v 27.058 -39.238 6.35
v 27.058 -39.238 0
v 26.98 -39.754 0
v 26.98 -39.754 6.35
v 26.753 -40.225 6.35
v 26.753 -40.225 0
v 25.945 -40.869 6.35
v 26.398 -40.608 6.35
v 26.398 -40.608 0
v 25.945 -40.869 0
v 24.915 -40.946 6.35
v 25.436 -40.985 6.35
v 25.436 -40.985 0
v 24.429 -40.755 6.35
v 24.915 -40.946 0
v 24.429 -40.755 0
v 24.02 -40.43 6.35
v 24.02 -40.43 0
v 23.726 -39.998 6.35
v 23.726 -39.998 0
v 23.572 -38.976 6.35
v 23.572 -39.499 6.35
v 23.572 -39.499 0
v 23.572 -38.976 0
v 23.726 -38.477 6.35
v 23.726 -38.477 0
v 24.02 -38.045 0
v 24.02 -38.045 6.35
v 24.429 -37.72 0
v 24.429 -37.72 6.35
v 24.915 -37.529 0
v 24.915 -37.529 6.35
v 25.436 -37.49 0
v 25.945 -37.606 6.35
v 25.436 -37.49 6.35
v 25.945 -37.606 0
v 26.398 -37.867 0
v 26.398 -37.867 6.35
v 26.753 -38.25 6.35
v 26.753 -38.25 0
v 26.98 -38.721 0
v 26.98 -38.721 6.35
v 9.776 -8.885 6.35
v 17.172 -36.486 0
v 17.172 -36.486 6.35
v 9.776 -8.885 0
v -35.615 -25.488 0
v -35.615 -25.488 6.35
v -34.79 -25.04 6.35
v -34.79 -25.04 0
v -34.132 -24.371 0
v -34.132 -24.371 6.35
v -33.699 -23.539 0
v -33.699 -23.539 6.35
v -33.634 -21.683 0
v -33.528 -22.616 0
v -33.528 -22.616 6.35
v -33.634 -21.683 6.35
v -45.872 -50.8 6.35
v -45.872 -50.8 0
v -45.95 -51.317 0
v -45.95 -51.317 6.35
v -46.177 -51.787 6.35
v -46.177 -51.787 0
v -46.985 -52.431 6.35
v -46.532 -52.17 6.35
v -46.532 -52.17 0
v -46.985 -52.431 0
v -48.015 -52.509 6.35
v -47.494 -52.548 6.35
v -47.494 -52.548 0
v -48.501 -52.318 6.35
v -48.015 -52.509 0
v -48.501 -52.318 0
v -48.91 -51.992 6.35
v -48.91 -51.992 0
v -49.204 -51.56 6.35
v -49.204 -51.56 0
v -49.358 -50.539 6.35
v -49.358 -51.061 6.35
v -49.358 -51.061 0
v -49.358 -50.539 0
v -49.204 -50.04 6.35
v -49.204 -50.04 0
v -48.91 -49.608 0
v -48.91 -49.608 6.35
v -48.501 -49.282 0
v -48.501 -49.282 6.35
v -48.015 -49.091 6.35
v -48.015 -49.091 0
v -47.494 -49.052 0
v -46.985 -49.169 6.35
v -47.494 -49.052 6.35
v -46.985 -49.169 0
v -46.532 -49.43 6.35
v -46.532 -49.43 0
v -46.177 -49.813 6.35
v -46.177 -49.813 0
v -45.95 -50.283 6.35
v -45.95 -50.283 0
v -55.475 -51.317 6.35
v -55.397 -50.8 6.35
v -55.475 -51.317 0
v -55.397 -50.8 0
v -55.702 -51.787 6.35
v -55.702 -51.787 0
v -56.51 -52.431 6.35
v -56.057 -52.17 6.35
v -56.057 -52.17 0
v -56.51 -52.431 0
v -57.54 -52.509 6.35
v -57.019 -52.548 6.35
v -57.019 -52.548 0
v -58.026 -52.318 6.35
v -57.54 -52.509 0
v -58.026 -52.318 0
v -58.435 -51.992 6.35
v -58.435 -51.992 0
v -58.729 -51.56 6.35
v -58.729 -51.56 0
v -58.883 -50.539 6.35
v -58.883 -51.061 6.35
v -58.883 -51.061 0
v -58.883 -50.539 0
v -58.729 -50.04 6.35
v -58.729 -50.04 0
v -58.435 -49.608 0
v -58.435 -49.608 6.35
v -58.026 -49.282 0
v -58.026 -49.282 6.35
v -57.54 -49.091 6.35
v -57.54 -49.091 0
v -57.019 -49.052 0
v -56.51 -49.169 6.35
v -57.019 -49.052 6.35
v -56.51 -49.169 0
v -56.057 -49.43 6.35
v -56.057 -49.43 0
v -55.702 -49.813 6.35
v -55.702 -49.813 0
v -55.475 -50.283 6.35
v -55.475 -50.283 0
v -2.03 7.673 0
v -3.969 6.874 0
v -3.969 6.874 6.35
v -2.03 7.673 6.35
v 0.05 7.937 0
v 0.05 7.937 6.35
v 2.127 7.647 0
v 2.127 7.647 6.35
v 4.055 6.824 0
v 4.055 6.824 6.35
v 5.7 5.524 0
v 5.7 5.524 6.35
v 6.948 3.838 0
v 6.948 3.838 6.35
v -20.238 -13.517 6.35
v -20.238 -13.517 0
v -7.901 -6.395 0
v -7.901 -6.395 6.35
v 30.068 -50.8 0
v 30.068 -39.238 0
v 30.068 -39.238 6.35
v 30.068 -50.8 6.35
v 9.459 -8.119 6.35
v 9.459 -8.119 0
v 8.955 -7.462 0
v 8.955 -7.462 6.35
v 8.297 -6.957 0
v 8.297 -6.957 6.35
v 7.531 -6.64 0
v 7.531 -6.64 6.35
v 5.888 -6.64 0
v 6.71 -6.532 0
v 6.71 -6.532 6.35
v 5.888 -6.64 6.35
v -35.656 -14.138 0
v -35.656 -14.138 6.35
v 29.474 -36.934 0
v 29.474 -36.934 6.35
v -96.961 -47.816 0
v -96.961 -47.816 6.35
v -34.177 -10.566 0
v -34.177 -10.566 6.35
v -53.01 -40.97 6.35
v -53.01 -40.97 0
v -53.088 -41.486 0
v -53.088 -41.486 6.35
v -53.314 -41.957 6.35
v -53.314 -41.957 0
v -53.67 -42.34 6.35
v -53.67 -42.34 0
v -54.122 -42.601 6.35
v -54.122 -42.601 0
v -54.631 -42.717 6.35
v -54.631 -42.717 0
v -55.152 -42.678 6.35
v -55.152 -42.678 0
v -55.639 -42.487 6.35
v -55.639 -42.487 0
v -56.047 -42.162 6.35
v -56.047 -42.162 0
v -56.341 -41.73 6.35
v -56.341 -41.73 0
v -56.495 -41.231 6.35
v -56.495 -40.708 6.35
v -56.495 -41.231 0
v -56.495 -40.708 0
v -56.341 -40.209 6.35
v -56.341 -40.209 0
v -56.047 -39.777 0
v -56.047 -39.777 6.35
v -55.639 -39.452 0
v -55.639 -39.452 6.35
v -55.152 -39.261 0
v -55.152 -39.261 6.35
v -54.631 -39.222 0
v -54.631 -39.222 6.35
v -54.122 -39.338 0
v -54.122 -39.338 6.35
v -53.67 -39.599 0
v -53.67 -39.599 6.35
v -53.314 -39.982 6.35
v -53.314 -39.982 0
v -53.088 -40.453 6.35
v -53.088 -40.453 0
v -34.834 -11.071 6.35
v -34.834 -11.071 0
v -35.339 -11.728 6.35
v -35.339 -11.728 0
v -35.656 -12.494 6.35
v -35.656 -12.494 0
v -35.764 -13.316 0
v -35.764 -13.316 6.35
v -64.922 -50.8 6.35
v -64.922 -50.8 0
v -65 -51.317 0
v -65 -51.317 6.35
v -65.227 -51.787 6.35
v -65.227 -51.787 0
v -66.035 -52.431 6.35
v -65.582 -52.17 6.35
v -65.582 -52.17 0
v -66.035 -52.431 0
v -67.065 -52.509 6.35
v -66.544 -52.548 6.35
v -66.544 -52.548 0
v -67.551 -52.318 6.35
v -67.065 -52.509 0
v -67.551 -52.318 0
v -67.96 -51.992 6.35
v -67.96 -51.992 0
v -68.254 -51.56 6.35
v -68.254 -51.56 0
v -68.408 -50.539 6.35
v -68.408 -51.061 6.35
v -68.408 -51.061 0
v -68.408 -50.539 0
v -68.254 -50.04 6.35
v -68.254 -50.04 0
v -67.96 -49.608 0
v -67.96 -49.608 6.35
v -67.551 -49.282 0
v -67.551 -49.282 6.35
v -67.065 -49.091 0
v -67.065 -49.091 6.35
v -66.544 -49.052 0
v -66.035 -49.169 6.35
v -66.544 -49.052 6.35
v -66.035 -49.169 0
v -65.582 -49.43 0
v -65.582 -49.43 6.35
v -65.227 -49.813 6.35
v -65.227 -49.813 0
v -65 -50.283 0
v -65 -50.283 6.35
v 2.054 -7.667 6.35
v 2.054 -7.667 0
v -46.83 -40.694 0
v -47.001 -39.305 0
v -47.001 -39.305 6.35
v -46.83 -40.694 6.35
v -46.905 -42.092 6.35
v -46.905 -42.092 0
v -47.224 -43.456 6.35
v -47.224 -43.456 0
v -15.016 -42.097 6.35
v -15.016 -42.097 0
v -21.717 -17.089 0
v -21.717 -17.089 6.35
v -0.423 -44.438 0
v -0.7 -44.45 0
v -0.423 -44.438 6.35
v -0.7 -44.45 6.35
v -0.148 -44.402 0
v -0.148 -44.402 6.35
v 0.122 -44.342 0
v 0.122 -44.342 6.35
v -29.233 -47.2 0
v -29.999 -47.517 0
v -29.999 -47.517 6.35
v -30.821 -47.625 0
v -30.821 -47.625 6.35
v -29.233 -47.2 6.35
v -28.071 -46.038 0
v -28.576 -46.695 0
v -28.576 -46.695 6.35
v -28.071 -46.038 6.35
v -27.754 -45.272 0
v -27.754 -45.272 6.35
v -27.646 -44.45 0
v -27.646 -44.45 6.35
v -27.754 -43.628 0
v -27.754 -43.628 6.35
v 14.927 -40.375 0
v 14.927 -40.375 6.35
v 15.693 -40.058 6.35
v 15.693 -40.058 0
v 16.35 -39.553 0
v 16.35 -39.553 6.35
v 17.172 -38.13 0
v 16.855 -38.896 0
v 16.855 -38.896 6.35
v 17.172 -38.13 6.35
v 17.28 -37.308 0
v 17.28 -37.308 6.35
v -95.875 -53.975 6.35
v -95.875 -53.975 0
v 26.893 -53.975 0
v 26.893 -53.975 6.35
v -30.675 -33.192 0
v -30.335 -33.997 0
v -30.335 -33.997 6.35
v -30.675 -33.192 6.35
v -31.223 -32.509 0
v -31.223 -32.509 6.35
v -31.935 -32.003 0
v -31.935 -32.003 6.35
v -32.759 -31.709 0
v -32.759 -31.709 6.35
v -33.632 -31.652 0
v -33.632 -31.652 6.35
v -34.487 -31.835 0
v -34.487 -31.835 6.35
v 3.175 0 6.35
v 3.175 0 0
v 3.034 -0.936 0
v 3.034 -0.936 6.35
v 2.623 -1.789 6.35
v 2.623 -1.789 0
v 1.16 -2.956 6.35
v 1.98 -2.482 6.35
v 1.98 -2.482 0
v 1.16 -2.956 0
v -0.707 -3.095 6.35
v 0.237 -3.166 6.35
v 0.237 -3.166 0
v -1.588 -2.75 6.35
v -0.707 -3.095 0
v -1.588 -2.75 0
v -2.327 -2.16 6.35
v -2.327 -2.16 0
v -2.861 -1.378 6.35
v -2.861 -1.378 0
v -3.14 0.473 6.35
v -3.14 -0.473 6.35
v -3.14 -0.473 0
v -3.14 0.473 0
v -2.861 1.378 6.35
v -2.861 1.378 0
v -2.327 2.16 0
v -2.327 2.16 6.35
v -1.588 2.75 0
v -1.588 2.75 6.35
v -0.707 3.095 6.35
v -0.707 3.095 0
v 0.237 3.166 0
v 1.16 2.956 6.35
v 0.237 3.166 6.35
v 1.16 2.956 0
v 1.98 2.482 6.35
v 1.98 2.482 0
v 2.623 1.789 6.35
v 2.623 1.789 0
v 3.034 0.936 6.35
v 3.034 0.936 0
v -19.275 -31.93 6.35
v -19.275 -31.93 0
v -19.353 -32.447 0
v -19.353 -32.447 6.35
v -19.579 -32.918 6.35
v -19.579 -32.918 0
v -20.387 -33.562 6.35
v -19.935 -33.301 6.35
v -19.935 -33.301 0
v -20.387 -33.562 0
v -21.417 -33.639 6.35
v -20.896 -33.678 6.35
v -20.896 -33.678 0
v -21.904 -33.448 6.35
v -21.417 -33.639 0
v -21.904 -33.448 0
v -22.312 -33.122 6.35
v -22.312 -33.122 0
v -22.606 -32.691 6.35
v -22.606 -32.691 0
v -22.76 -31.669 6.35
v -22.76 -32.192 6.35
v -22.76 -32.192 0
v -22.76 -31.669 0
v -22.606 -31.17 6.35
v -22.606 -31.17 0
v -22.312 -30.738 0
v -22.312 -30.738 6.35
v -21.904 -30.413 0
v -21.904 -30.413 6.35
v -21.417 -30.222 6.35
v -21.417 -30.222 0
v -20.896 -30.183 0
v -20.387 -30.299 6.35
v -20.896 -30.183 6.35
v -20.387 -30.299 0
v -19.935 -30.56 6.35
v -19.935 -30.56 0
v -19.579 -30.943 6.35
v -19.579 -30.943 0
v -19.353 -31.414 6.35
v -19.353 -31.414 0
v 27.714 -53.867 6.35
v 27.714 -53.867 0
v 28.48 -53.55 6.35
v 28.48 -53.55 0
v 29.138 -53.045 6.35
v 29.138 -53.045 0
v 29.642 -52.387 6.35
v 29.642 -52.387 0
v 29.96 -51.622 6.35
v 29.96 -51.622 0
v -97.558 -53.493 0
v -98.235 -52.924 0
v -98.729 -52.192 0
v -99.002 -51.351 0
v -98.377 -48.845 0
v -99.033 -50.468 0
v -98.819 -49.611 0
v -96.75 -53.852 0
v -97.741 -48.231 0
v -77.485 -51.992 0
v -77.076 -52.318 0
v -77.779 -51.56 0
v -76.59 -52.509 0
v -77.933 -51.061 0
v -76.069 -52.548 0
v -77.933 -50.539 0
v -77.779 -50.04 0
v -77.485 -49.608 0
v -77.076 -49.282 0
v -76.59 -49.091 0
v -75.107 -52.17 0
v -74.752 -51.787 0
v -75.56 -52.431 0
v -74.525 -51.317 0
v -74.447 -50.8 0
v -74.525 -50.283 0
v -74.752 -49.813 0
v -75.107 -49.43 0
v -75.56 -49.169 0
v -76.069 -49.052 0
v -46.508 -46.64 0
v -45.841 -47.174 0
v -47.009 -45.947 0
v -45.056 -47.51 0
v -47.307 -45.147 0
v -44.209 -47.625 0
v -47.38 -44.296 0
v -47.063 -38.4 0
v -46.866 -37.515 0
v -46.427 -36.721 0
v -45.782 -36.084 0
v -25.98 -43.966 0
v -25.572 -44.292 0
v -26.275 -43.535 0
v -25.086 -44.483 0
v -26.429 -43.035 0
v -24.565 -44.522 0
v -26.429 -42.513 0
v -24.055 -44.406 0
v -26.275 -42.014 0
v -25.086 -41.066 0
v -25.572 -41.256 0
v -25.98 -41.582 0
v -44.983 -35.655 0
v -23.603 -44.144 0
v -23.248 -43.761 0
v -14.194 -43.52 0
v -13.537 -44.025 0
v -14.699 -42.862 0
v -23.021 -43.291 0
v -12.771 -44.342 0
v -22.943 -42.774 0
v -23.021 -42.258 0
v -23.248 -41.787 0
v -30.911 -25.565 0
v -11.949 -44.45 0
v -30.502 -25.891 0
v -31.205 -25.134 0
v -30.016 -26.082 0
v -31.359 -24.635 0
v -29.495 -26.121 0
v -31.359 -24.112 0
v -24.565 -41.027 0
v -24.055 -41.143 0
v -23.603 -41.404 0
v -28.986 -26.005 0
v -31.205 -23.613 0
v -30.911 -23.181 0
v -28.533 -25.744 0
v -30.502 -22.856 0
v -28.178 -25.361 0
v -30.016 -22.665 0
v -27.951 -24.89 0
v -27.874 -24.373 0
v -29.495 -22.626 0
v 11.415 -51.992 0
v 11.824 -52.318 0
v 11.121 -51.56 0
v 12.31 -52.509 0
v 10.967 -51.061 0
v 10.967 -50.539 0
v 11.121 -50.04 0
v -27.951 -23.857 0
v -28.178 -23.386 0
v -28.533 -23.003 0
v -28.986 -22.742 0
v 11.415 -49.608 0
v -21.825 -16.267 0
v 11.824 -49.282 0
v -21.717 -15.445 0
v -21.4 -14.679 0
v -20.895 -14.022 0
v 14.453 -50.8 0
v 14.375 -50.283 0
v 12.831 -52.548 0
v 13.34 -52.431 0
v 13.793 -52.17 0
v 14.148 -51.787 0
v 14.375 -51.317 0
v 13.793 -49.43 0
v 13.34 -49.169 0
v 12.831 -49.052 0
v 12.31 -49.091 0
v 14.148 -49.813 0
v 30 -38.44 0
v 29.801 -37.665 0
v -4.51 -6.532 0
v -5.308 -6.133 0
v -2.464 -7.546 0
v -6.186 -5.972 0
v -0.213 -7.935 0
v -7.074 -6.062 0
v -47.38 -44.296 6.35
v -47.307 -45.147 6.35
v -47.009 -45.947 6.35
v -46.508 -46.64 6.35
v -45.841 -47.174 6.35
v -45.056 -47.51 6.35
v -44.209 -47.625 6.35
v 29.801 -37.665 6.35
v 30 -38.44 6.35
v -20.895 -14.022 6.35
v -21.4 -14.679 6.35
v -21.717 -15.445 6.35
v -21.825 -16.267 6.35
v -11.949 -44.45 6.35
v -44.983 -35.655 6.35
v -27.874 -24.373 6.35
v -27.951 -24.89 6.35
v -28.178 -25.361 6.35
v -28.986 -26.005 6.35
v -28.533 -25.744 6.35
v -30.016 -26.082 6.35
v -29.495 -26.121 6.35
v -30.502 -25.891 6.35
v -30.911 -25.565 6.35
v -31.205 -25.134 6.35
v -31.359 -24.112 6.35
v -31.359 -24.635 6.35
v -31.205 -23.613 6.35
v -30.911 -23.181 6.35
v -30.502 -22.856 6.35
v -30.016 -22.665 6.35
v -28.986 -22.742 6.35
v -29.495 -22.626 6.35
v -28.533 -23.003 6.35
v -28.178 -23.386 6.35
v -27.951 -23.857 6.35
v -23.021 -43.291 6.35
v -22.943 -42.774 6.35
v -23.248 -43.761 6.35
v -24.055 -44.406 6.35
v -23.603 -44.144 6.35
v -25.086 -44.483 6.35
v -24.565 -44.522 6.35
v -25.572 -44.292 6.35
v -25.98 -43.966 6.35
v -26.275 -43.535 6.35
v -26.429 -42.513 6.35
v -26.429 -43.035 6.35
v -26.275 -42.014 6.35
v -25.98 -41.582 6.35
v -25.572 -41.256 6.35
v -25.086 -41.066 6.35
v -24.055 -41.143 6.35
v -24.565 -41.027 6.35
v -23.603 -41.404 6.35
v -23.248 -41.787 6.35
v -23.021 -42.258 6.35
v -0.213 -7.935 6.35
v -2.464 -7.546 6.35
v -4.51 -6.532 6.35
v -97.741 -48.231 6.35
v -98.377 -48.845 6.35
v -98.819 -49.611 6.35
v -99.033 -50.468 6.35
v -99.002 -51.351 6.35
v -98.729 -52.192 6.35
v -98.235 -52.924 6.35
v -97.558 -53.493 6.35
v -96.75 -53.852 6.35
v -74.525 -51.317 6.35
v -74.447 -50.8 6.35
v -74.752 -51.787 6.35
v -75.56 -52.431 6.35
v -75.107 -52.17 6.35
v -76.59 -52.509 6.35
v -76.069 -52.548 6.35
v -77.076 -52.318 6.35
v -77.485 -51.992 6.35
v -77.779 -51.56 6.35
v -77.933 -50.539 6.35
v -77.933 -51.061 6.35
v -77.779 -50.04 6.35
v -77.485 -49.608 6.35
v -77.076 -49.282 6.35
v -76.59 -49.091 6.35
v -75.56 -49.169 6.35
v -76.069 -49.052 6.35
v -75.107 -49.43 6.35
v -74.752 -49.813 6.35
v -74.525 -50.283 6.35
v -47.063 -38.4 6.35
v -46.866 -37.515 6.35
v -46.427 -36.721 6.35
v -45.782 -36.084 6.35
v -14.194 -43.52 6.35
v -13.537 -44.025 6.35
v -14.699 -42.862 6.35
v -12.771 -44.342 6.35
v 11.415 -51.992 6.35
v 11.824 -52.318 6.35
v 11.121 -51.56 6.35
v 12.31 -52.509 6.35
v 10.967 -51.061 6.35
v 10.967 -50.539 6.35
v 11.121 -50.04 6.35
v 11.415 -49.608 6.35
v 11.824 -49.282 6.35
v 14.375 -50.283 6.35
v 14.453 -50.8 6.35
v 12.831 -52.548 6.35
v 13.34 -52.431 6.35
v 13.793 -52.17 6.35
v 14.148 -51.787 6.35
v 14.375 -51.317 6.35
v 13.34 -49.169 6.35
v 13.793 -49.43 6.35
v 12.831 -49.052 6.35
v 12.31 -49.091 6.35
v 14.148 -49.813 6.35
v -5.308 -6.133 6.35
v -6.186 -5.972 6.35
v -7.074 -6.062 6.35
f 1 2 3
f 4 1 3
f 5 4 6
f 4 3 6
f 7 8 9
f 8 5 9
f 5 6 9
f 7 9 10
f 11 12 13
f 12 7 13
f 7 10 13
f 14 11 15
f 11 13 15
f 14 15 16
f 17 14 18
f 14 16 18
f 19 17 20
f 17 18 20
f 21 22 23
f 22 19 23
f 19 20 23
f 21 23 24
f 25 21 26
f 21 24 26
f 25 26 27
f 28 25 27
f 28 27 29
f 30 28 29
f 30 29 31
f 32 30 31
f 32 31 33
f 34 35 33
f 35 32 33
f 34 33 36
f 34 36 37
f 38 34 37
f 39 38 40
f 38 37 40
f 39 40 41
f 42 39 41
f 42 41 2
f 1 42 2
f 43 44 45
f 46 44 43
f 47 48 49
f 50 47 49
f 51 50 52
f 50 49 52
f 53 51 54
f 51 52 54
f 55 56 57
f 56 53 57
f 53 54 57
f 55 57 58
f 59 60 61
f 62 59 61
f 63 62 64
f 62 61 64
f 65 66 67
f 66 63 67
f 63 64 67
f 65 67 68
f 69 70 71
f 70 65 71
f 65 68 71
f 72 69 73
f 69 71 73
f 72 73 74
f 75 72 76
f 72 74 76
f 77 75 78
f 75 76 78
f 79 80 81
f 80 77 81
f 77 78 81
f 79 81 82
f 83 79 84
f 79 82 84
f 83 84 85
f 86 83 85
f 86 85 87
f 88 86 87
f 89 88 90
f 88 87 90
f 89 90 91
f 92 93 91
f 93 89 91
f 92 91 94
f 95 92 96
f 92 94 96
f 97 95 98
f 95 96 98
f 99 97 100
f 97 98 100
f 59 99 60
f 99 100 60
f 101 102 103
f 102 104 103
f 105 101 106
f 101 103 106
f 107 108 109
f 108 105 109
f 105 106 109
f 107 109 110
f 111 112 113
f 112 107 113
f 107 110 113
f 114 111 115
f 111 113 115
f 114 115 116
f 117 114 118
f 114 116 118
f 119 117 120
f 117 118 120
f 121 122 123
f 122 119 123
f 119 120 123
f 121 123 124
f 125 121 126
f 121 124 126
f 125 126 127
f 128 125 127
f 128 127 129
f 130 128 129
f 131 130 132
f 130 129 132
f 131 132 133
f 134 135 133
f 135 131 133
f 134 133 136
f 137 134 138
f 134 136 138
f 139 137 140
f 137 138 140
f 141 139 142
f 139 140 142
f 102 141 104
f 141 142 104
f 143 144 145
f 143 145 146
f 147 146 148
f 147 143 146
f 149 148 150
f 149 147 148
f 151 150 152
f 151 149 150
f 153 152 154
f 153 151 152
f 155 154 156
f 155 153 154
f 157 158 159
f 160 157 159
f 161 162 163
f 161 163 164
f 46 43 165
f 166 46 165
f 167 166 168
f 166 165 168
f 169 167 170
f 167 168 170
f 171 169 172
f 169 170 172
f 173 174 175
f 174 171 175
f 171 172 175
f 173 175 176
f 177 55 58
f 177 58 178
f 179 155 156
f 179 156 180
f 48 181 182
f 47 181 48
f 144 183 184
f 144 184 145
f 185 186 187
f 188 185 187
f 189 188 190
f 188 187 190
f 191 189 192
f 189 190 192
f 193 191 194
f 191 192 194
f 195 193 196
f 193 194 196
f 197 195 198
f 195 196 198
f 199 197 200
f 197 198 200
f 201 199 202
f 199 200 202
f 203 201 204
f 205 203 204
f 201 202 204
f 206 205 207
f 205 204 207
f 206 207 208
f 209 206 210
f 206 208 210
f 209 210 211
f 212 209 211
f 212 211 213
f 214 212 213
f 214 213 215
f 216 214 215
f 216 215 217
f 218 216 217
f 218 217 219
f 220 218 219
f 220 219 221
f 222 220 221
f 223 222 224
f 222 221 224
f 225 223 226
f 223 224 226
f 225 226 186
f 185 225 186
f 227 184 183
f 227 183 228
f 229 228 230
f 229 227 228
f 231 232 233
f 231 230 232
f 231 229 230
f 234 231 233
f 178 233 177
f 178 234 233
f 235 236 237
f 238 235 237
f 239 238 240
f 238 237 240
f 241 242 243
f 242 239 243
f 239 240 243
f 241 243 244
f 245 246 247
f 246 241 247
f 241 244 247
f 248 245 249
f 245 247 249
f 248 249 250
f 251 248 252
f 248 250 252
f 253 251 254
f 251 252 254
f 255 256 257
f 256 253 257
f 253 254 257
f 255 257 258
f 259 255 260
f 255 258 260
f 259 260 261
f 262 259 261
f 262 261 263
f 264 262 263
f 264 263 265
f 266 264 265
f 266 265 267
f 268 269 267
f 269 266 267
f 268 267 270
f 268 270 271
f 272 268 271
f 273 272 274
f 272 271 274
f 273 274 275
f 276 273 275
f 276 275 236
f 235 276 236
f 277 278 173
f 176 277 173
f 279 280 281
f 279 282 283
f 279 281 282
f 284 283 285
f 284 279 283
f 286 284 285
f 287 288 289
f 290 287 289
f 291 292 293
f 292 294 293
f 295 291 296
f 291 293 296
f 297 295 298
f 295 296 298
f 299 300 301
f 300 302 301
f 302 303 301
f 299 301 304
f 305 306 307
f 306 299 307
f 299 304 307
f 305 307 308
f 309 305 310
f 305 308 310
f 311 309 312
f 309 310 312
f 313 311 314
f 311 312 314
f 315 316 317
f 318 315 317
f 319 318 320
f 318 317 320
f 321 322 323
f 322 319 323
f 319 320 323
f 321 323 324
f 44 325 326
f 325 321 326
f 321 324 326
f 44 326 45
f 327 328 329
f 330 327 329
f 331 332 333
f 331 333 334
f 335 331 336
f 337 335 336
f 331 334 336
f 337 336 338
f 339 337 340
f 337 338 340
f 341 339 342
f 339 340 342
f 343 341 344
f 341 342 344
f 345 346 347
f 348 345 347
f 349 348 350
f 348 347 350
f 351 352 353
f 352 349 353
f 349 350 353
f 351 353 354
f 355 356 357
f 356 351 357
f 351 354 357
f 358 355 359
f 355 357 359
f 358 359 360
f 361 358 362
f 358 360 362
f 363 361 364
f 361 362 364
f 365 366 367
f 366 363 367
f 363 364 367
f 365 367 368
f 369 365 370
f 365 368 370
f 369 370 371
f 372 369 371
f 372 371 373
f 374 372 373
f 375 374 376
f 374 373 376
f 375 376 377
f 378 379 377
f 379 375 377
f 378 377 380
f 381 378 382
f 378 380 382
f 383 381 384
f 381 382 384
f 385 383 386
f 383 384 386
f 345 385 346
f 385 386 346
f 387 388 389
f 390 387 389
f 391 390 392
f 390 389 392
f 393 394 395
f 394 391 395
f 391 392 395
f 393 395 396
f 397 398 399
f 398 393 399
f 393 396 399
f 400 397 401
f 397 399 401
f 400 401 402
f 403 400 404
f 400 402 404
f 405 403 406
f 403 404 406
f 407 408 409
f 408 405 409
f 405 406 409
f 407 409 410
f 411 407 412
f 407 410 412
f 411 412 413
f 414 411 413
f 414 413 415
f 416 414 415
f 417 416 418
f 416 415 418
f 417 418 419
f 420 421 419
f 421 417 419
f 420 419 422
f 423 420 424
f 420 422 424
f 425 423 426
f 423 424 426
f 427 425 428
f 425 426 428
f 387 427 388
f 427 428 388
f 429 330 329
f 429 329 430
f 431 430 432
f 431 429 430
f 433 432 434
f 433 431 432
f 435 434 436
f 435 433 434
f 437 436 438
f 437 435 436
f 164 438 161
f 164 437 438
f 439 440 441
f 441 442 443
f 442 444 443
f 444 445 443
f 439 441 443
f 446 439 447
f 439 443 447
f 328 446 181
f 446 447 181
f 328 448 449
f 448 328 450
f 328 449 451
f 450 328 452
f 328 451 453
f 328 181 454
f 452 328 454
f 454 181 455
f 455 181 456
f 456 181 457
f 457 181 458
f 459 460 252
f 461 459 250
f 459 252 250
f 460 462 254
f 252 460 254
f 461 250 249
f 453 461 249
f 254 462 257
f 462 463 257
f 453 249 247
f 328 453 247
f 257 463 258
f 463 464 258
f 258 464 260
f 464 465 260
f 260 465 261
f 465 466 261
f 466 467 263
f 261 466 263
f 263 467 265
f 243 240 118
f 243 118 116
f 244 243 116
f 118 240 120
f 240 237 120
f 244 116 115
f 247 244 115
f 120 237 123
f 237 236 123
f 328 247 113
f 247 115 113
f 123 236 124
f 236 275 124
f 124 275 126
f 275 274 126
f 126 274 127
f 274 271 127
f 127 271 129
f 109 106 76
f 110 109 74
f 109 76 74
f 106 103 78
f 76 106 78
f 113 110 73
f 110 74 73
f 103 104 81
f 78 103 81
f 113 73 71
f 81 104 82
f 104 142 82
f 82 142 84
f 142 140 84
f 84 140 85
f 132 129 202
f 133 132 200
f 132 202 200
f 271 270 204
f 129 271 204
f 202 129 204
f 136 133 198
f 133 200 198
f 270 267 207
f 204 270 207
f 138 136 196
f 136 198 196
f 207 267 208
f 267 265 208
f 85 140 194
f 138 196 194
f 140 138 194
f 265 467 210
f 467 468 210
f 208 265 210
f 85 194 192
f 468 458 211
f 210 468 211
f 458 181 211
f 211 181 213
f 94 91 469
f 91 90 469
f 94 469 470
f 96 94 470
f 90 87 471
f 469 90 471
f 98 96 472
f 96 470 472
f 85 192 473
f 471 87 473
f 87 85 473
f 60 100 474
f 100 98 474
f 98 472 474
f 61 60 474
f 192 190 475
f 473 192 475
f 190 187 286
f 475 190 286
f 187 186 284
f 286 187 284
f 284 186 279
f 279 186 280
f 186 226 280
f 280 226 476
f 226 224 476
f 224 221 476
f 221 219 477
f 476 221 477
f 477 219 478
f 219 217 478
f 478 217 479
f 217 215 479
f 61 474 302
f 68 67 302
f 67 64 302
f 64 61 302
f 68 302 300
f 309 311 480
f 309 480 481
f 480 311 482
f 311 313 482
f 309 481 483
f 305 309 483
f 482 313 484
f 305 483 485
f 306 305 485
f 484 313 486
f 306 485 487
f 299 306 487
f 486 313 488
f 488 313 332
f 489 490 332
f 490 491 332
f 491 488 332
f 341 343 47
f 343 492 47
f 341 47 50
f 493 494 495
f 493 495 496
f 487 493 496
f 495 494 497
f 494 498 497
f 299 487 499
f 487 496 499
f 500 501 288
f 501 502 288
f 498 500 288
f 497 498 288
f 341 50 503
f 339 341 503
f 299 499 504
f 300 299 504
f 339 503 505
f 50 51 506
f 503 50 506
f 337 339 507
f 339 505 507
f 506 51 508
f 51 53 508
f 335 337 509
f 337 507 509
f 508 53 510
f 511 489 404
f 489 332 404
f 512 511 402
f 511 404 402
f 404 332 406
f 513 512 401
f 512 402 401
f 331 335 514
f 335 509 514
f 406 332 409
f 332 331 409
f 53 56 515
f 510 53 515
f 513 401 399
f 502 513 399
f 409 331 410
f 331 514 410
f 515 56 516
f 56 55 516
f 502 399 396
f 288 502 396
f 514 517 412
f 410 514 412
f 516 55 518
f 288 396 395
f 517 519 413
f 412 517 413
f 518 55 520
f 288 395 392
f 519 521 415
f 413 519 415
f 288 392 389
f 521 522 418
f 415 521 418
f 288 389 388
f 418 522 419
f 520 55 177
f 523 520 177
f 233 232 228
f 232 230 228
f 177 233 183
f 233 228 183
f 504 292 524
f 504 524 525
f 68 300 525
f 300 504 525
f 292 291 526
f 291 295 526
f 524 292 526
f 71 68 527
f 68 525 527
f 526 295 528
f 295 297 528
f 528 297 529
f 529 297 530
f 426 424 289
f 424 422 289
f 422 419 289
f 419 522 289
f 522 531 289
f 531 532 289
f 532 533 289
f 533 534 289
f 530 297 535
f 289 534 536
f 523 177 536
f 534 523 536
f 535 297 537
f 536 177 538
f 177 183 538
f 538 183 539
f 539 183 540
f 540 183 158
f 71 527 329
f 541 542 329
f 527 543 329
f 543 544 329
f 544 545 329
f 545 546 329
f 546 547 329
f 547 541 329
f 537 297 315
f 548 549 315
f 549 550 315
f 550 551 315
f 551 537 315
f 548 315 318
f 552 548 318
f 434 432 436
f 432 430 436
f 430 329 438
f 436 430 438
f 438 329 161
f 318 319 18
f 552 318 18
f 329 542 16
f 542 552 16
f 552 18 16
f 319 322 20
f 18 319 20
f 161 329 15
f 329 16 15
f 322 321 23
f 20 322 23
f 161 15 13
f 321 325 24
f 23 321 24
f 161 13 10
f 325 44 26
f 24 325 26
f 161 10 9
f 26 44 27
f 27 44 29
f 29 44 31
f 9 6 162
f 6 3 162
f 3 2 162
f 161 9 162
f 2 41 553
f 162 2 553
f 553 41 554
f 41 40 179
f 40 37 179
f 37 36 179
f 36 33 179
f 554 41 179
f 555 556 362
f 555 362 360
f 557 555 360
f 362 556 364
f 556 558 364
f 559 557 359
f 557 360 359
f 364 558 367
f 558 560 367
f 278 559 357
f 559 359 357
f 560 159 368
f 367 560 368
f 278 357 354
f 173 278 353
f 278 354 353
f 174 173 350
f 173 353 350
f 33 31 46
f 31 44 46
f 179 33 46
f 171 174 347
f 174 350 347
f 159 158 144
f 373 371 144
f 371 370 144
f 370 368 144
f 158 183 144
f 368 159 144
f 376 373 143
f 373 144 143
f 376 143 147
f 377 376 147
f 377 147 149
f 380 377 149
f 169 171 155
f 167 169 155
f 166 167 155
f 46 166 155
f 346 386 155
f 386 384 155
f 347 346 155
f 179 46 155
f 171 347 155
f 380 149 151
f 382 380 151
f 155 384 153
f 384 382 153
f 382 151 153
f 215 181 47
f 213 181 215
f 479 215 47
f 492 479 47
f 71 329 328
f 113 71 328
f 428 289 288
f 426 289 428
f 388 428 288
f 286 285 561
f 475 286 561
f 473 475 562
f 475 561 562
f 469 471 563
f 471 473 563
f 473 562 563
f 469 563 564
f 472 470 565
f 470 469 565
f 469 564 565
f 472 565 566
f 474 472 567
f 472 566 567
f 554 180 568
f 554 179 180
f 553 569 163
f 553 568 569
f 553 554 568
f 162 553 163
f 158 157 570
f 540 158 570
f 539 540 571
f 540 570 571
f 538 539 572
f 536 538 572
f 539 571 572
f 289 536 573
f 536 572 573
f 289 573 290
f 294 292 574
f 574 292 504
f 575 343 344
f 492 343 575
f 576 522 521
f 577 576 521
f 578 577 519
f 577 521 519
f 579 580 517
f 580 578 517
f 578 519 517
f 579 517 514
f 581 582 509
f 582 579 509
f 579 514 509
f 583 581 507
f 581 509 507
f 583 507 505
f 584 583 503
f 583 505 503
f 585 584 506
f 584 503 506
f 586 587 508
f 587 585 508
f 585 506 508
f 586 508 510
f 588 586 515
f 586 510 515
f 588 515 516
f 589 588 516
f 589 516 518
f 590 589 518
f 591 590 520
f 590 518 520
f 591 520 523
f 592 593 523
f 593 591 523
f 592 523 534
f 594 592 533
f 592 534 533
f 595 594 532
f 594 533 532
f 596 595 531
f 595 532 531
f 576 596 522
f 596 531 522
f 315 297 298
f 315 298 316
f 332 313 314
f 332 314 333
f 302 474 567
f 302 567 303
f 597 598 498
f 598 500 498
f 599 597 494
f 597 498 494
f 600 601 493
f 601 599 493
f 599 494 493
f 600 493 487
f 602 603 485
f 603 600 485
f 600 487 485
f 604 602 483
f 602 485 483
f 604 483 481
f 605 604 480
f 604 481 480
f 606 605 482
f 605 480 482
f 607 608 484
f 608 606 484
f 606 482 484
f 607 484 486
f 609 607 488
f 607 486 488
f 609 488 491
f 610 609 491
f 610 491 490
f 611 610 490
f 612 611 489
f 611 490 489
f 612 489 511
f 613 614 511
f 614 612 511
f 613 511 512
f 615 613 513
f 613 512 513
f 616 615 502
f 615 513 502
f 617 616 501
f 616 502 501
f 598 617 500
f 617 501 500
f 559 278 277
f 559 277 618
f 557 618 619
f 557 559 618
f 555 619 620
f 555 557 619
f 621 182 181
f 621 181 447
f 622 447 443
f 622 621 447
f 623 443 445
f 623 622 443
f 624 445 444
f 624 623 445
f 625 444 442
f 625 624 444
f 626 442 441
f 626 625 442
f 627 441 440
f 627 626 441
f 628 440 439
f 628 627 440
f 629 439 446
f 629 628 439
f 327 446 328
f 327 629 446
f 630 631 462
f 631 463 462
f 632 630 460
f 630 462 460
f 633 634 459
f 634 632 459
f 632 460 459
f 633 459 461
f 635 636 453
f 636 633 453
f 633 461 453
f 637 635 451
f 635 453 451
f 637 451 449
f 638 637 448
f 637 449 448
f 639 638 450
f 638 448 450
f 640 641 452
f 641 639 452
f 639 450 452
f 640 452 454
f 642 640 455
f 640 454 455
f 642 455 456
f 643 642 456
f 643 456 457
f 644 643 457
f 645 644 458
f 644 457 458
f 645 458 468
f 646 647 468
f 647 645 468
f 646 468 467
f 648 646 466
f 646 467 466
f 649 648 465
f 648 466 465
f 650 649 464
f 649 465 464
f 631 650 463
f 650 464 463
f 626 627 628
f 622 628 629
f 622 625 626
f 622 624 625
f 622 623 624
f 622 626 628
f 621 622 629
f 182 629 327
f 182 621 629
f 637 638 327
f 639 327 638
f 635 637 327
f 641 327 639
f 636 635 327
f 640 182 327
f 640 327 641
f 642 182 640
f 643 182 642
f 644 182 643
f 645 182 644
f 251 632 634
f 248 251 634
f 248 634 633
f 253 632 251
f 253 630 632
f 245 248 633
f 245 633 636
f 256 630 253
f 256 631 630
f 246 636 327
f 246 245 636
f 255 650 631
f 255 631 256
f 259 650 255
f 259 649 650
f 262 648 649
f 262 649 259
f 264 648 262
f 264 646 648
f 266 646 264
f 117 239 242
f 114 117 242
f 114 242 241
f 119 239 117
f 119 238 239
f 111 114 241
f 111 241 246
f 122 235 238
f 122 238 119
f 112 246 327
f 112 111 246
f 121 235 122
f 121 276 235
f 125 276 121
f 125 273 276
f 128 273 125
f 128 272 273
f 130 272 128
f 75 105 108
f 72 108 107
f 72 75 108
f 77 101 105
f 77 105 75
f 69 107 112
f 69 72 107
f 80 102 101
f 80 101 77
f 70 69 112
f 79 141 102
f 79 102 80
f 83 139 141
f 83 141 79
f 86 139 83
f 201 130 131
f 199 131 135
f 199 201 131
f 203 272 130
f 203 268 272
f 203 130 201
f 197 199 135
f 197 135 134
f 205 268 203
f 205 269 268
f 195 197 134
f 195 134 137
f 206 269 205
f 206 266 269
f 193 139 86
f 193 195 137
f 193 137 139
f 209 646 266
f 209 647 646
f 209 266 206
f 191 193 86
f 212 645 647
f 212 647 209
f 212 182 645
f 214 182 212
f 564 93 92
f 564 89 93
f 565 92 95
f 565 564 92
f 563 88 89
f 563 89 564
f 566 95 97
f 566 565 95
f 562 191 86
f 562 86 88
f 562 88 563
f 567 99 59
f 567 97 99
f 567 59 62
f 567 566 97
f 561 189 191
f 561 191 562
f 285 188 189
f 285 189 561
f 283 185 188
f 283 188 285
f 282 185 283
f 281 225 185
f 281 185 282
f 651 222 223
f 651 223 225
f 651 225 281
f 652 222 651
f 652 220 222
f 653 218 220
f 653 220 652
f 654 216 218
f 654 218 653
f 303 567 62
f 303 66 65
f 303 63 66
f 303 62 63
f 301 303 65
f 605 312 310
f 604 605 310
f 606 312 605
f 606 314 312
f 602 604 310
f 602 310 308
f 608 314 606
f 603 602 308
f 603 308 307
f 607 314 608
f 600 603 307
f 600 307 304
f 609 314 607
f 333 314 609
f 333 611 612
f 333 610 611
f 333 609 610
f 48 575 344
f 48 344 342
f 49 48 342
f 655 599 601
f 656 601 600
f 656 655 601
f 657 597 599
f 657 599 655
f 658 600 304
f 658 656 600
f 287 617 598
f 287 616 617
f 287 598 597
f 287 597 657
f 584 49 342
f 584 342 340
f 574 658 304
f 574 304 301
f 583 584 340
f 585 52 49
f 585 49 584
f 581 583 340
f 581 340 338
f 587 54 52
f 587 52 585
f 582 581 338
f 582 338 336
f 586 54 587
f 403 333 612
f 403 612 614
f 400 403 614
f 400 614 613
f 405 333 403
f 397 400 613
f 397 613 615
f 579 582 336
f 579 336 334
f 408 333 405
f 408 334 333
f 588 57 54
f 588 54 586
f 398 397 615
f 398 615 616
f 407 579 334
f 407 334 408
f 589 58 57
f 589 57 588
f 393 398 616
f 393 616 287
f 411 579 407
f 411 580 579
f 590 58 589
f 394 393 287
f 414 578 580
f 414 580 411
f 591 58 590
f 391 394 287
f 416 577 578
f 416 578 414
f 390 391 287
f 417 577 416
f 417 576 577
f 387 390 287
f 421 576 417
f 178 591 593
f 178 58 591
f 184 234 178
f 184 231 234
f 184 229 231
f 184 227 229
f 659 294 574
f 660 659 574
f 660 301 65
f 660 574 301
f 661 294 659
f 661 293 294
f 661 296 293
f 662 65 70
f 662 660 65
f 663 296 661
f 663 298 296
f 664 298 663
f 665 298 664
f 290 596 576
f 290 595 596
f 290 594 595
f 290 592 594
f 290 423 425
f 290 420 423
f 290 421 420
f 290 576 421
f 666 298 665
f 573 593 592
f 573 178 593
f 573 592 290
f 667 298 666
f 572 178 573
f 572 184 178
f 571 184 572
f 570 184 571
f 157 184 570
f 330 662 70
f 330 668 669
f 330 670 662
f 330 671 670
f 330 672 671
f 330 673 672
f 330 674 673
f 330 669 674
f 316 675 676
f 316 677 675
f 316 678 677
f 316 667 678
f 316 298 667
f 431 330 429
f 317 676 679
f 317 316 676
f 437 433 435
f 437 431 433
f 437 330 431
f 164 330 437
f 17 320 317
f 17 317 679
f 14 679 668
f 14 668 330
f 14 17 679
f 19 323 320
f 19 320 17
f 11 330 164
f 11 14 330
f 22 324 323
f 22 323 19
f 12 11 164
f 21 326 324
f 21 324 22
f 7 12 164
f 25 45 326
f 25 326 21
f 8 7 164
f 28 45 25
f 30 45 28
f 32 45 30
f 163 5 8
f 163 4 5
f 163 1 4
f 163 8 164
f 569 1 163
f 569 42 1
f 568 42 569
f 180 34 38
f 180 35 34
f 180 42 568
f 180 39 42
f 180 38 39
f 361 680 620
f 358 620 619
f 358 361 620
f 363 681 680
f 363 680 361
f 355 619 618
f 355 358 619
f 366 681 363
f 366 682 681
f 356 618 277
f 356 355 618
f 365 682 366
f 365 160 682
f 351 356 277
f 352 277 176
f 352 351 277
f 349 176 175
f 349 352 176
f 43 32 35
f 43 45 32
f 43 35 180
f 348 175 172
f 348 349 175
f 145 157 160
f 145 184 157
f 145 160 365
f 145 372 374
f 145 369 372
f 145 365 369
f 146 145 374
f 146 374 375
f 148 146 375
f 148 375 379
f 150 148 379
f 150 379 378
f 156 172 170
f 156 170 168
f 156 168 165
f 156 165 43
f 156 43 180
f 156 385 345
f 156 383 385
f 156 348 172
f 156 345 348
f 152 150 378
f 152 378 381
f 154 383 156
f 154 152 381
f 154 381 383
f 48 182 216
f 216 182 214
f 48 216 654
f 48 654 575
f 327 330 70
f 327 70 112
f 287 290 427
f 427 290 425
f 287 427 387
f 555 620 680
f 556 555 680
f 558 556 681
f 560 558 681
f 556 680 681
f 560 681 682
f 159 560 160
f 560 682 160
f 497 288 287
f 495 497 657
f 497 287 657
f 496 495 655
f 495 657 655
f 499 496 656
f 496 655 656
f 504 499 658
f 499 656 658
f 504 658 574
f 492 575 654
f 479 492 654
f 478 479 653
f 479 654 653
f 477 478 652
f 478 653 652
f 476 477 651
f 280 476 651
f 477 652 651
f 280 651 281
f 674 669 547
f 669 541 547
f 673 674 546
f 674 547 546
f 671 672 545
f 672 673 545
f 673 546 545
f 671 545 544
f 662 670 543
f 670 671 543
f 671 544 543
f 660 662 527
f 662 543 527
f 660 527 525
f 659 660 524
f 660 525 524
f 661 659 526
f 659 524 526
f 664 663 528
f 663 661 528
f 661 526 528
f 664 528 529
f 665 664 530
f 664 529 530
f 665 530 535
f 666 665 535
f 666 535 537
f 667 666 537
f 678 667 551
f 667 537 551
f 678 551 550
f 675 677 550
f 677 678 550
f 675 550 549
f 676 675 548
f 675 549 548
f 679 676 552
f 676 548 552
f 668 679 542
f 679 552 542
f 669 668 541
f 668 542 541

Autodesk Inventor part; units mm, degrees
ref_plane "YZ Plane" through (0, 0, 0) normal (1, 0, 0) x (0, 1, 0)
ref_plane "XZ Plane" through (0, 0, 0) normal (0, 1, 0) x (-1, 0, 0)
ref_plane "XY Plane" through (0, 0, 0) normal (0, 0, 1) x (1, 0, 0)
sketch "Sketch2" plane through (0, 0, 0) normal (0, 0, 1) x (1, 0, 0)
  circle A0 centre (0, 0) radius 3.175
  circle A1 centre (0, 0) radius 7.9375
  line L0 (-24.9815, -53.975) -> (30.0677, -53.975)
  line L1 (-24.9815, -53.975) -> (-36.2864, -11.7845)
  line L2 (-36.2864, -11.7845) -> (-3.9688, 6.8741)
  line L3 (20.5427, -47.625) -> (-13.5349, -47.625)
  line L4 (-13.5349, -47.625) -> (-22.3476, -14.7355)
  line L5 (-22.3476, -14.7355) -> (-5.9414, -5.2634)
  line L6 (-18.5621, -41.1307) -> (-23.4926, -22.7298) construction
  line L7 (-23.4926, -22.7298) -> (-29.6262, -24.3733) construction
  line L8 (-29.6262, -24.3733) -> (-24.6957, -42.7742) construction
  line L9 (-24.6957, -42.7742) -> (-18.5621, -41.1307) construction
  line L10 (-18.5621, -41.1307) -> (-29.6262, -24.3733) construction
  line L11 (-23.4926, -22.7298) -> (-24.6957, -42.7742) construction
  circle A2 centre (-29.6262, -24.3733) radius 1.7526
  circle A3 centre (-24.6957, -42.7742) radius 1.7526
  circle A4 centre (-21.0273, -31.9303) radius 1.7526
  line L12 (25.3052, -45.5804) -> (25.3052, -53.975) construction
  circle A5 centre (25.3052, -39.2375) radius 1.7526
  line L13 (0, 0) -> (-58.6646, -15.7191) construction
  line L14 (-24.0941, -32.752) -> (-30.6681, -8.2175) construction
  circle A6 centre (25.3052, -39.2375) radius 4.7625
  line L15 (30.0677, -39.2375) -> (30.0677, -53.975)
  line L16 (20.5427, -39.2375) -> (20.5427, -47.625)
  line L17 (-30.2278, -34.3955) -> (-17.9605, -31.1085) construction
  line L18 (-24.9815, -53.975) -> (-113.8815, -53.975)
  circle A7 centre (-9.9632, -48.6877) radius 1.7526
  line L19 (-9.9632, -48.6877) -> (-25.2973, -52.7964) construction
  line L20 (25.3052, -39.2375) -> (24.0725, -34.6373) construction
  line L21 (-31.2313, -30.6503) -> (-77.8688, -47.625)
  line L22 (-77.8688, -47.625) -> (-26.6829, -47.625)
  line L23 (-9.9632, -48.6877) -> (-10.4168, -46.9948) construction
  circle A8 centre (25.3052, -39.2375) radius 1.7526
  circle A9 centre (25.3052, -39.2375) radius 4.7625
  line L24 (17.994, -39.5531) -> (8.9547, -5.8181)
  line L25 (8.9547, -5.8181) -> (-22.4801, -14.241) construction
  line L26 (-22.4801, -14.241) -> (-13.4409, -47.976) construction
  line L27 (-0.2817, -44.45) -> (17.994, -39.5531)
  line L28 (17.994, -39.5531) -> (-22.4801, -14.241) construction
  line L29 (8.9547, -5.8181) -> (-13.4409, -47.976) construction
  line L30 (6.9477, 3.8384) -> (29.4738, -36.9345)
  line L31 (2.0544, -7.667) -> (8.9547, -5.8181)
  circle A10 centre (-9.9632, -48.6877) radius 4.7625 construction
  line L32 (-0.2817, -44.45) -> (-14.3857, -44.45)
  line L33 (-113.8815, -53.975) -> (-32.8811, -24.4933)
  circle A11 centre (-54.7623, -40.9695) radius 1.7526
  circle A12 centre (-54.7623, -40.9695) radius 7.9375
  line L34 (-54.7623, -40.9695) -> (-56.8404, -33.2138) construction
  line L35 (-25.8322, -50.8) -> (-105.1582, -50.8) construction
  circle A13 centre (-47.625, -50.8) radius 1.7526
  circle A14 centre (-57.15, -50.8) radius 1.7526
  circle A15 centre (-66.675, -50.8) radius 1.7526
  circle A16 centre (-76.2, -50.8) radius 1.7526
  circle A17 centre (12.7, -50.8) radius 1.7526
  line L36 (0.6918, 7.9073) -> (27.1694, 5.5908)
  circle A18 centre (26.8927, 2.4279) radius 1.7526
  circle A19 centre (26.8927, 2.4279) radius 3.175
  line L37 (8.6038, 0.8408) -> (26.616, -0.735)
  circle A20 centre (17.4039, 3.258) radius 1.7526
  line L38 (-9.9632, -48.6877) -> (-9.9632, -48.6877) construction
  point P0 (7.667, 2.0544)
  point P1 (0.4795, -7.923)
  point P2 (-24.0941, -32.752)
  point P3 (-2.2431, -26.897)
  point P4 (-2.2431, -26.897)
  point P5 (-12.1309, -47.625)
  point P6 (-15.5208, -47.3441)
  point P7 (29.4738, -36.9345)
  point P8 (-14.3857, -44.45)
  point P9 (-9.6568, -46.9621)
  point P10 (-9.6568, -46.9621)
  point P11 (-48.0301, -36.7646)
  point P12 (-59.0876, -47.625)
  point P13 (-62.6223, -42.0757)
  point P14 (-50.4369, -47.625)
  point P15 (13.8439, -8.6439)
  point P16 (24.4605, 0.387)
  point P17 (23.7298, 2.7046)
  dimension "d7" = 15.875
  dimension "d40" = 3.5052
  dimension "d6" = 6.35
  dimension "Angle_Mount" = 105
  dimension "d17" = 105
  dimension "d19" = 9.525
  dimension "d20" = 12.7
  dimension "d24" = 19.05
  dimension "d25" = 6.35
  dimension "d26" = 3.5052
  dimension "d27" = 3.5052
  dimension "d28" = 3.5052
  dimension "d29" = 6.35
  dimension "d33" = 3.5052
  dimension "d35" = 31.75
  dimension "d37" = 9.525
  dimension "d38" = 25.4
  dimension "d39" = 53.975
  dimension "d41" = 44.45
  dimension "Rail_Offset" = 36.5125
  dimension "d45" = 6.35
  dimension "d48" = 22.225
  dimension "d49" = 3.5052
  dimension "d51" = 9.525
  dimension "d52" = 32.5438
  dimension "d53" = 34.925
  dimension "d54" = 9.525
  dimension "d56" = 9.525
  dimension "d58" = 6.35
  dimension "d60" = 20
  dimension "d61" = 88.9
  dimension "d69" = 31.75
  dimension "d71" = 3.5052
  dimension "d72" = 15.875
  dimension "d74" = 3.175
  dimension "d75" = 3.5052
  dimension "d76" = 47.625
  dimension "d79" = 9.525
  dimension "d84" = 3.5052
  dimension "d85" = 60.325
  dimension "d86" = 145
  dimension "d87" = 3.5052
  dimension "d88" = 6.35
  dimension "d101" = 9.525
extrude "Extrusion2" add sketch "Sketch2" along normal blind 6.35 contours A1 | A1 L30 A6 L16 L3 A7 L4 L32 L27 L24 L31 | L5 L4 L3 A7 L16 A6 L15 L0 L1 L2 A1 | A6 | L1 L21 A12 L22 L18 L33 | A7 L3 | L3 A7 | A12 L22 L21 A11 | L21 A11 A12 | A12 L22 | A12 L22 L21
fillet "Fillet1" radius 3.175 15 edges at (-22.3476, -14.7355, 3.175) (-5.9414, -5.2634, 3.175) (8.9547, -5.8181, 3.175) (17.994, -39.5531, 3.175) (-14.3857, -44.45, 3.175) (-0.2817, -44.45, 3.175) (30.0677, -53.975, 3.175) (-36.2864, -11.7845, 3.175) (-26.6829, -47.625, 3.175) (-50.4369, -47.625, 3.175) (-48.0301, -36.7646, 3.175) (-31.2313, -30.6503, 3.175) (-32.8811, -24.4933, 3.175) (-113.8815, -53.975, 3.175) (6.9477, 3.8384, 3.175)
properties part number "Uprights" material "Aluminum 6061"
